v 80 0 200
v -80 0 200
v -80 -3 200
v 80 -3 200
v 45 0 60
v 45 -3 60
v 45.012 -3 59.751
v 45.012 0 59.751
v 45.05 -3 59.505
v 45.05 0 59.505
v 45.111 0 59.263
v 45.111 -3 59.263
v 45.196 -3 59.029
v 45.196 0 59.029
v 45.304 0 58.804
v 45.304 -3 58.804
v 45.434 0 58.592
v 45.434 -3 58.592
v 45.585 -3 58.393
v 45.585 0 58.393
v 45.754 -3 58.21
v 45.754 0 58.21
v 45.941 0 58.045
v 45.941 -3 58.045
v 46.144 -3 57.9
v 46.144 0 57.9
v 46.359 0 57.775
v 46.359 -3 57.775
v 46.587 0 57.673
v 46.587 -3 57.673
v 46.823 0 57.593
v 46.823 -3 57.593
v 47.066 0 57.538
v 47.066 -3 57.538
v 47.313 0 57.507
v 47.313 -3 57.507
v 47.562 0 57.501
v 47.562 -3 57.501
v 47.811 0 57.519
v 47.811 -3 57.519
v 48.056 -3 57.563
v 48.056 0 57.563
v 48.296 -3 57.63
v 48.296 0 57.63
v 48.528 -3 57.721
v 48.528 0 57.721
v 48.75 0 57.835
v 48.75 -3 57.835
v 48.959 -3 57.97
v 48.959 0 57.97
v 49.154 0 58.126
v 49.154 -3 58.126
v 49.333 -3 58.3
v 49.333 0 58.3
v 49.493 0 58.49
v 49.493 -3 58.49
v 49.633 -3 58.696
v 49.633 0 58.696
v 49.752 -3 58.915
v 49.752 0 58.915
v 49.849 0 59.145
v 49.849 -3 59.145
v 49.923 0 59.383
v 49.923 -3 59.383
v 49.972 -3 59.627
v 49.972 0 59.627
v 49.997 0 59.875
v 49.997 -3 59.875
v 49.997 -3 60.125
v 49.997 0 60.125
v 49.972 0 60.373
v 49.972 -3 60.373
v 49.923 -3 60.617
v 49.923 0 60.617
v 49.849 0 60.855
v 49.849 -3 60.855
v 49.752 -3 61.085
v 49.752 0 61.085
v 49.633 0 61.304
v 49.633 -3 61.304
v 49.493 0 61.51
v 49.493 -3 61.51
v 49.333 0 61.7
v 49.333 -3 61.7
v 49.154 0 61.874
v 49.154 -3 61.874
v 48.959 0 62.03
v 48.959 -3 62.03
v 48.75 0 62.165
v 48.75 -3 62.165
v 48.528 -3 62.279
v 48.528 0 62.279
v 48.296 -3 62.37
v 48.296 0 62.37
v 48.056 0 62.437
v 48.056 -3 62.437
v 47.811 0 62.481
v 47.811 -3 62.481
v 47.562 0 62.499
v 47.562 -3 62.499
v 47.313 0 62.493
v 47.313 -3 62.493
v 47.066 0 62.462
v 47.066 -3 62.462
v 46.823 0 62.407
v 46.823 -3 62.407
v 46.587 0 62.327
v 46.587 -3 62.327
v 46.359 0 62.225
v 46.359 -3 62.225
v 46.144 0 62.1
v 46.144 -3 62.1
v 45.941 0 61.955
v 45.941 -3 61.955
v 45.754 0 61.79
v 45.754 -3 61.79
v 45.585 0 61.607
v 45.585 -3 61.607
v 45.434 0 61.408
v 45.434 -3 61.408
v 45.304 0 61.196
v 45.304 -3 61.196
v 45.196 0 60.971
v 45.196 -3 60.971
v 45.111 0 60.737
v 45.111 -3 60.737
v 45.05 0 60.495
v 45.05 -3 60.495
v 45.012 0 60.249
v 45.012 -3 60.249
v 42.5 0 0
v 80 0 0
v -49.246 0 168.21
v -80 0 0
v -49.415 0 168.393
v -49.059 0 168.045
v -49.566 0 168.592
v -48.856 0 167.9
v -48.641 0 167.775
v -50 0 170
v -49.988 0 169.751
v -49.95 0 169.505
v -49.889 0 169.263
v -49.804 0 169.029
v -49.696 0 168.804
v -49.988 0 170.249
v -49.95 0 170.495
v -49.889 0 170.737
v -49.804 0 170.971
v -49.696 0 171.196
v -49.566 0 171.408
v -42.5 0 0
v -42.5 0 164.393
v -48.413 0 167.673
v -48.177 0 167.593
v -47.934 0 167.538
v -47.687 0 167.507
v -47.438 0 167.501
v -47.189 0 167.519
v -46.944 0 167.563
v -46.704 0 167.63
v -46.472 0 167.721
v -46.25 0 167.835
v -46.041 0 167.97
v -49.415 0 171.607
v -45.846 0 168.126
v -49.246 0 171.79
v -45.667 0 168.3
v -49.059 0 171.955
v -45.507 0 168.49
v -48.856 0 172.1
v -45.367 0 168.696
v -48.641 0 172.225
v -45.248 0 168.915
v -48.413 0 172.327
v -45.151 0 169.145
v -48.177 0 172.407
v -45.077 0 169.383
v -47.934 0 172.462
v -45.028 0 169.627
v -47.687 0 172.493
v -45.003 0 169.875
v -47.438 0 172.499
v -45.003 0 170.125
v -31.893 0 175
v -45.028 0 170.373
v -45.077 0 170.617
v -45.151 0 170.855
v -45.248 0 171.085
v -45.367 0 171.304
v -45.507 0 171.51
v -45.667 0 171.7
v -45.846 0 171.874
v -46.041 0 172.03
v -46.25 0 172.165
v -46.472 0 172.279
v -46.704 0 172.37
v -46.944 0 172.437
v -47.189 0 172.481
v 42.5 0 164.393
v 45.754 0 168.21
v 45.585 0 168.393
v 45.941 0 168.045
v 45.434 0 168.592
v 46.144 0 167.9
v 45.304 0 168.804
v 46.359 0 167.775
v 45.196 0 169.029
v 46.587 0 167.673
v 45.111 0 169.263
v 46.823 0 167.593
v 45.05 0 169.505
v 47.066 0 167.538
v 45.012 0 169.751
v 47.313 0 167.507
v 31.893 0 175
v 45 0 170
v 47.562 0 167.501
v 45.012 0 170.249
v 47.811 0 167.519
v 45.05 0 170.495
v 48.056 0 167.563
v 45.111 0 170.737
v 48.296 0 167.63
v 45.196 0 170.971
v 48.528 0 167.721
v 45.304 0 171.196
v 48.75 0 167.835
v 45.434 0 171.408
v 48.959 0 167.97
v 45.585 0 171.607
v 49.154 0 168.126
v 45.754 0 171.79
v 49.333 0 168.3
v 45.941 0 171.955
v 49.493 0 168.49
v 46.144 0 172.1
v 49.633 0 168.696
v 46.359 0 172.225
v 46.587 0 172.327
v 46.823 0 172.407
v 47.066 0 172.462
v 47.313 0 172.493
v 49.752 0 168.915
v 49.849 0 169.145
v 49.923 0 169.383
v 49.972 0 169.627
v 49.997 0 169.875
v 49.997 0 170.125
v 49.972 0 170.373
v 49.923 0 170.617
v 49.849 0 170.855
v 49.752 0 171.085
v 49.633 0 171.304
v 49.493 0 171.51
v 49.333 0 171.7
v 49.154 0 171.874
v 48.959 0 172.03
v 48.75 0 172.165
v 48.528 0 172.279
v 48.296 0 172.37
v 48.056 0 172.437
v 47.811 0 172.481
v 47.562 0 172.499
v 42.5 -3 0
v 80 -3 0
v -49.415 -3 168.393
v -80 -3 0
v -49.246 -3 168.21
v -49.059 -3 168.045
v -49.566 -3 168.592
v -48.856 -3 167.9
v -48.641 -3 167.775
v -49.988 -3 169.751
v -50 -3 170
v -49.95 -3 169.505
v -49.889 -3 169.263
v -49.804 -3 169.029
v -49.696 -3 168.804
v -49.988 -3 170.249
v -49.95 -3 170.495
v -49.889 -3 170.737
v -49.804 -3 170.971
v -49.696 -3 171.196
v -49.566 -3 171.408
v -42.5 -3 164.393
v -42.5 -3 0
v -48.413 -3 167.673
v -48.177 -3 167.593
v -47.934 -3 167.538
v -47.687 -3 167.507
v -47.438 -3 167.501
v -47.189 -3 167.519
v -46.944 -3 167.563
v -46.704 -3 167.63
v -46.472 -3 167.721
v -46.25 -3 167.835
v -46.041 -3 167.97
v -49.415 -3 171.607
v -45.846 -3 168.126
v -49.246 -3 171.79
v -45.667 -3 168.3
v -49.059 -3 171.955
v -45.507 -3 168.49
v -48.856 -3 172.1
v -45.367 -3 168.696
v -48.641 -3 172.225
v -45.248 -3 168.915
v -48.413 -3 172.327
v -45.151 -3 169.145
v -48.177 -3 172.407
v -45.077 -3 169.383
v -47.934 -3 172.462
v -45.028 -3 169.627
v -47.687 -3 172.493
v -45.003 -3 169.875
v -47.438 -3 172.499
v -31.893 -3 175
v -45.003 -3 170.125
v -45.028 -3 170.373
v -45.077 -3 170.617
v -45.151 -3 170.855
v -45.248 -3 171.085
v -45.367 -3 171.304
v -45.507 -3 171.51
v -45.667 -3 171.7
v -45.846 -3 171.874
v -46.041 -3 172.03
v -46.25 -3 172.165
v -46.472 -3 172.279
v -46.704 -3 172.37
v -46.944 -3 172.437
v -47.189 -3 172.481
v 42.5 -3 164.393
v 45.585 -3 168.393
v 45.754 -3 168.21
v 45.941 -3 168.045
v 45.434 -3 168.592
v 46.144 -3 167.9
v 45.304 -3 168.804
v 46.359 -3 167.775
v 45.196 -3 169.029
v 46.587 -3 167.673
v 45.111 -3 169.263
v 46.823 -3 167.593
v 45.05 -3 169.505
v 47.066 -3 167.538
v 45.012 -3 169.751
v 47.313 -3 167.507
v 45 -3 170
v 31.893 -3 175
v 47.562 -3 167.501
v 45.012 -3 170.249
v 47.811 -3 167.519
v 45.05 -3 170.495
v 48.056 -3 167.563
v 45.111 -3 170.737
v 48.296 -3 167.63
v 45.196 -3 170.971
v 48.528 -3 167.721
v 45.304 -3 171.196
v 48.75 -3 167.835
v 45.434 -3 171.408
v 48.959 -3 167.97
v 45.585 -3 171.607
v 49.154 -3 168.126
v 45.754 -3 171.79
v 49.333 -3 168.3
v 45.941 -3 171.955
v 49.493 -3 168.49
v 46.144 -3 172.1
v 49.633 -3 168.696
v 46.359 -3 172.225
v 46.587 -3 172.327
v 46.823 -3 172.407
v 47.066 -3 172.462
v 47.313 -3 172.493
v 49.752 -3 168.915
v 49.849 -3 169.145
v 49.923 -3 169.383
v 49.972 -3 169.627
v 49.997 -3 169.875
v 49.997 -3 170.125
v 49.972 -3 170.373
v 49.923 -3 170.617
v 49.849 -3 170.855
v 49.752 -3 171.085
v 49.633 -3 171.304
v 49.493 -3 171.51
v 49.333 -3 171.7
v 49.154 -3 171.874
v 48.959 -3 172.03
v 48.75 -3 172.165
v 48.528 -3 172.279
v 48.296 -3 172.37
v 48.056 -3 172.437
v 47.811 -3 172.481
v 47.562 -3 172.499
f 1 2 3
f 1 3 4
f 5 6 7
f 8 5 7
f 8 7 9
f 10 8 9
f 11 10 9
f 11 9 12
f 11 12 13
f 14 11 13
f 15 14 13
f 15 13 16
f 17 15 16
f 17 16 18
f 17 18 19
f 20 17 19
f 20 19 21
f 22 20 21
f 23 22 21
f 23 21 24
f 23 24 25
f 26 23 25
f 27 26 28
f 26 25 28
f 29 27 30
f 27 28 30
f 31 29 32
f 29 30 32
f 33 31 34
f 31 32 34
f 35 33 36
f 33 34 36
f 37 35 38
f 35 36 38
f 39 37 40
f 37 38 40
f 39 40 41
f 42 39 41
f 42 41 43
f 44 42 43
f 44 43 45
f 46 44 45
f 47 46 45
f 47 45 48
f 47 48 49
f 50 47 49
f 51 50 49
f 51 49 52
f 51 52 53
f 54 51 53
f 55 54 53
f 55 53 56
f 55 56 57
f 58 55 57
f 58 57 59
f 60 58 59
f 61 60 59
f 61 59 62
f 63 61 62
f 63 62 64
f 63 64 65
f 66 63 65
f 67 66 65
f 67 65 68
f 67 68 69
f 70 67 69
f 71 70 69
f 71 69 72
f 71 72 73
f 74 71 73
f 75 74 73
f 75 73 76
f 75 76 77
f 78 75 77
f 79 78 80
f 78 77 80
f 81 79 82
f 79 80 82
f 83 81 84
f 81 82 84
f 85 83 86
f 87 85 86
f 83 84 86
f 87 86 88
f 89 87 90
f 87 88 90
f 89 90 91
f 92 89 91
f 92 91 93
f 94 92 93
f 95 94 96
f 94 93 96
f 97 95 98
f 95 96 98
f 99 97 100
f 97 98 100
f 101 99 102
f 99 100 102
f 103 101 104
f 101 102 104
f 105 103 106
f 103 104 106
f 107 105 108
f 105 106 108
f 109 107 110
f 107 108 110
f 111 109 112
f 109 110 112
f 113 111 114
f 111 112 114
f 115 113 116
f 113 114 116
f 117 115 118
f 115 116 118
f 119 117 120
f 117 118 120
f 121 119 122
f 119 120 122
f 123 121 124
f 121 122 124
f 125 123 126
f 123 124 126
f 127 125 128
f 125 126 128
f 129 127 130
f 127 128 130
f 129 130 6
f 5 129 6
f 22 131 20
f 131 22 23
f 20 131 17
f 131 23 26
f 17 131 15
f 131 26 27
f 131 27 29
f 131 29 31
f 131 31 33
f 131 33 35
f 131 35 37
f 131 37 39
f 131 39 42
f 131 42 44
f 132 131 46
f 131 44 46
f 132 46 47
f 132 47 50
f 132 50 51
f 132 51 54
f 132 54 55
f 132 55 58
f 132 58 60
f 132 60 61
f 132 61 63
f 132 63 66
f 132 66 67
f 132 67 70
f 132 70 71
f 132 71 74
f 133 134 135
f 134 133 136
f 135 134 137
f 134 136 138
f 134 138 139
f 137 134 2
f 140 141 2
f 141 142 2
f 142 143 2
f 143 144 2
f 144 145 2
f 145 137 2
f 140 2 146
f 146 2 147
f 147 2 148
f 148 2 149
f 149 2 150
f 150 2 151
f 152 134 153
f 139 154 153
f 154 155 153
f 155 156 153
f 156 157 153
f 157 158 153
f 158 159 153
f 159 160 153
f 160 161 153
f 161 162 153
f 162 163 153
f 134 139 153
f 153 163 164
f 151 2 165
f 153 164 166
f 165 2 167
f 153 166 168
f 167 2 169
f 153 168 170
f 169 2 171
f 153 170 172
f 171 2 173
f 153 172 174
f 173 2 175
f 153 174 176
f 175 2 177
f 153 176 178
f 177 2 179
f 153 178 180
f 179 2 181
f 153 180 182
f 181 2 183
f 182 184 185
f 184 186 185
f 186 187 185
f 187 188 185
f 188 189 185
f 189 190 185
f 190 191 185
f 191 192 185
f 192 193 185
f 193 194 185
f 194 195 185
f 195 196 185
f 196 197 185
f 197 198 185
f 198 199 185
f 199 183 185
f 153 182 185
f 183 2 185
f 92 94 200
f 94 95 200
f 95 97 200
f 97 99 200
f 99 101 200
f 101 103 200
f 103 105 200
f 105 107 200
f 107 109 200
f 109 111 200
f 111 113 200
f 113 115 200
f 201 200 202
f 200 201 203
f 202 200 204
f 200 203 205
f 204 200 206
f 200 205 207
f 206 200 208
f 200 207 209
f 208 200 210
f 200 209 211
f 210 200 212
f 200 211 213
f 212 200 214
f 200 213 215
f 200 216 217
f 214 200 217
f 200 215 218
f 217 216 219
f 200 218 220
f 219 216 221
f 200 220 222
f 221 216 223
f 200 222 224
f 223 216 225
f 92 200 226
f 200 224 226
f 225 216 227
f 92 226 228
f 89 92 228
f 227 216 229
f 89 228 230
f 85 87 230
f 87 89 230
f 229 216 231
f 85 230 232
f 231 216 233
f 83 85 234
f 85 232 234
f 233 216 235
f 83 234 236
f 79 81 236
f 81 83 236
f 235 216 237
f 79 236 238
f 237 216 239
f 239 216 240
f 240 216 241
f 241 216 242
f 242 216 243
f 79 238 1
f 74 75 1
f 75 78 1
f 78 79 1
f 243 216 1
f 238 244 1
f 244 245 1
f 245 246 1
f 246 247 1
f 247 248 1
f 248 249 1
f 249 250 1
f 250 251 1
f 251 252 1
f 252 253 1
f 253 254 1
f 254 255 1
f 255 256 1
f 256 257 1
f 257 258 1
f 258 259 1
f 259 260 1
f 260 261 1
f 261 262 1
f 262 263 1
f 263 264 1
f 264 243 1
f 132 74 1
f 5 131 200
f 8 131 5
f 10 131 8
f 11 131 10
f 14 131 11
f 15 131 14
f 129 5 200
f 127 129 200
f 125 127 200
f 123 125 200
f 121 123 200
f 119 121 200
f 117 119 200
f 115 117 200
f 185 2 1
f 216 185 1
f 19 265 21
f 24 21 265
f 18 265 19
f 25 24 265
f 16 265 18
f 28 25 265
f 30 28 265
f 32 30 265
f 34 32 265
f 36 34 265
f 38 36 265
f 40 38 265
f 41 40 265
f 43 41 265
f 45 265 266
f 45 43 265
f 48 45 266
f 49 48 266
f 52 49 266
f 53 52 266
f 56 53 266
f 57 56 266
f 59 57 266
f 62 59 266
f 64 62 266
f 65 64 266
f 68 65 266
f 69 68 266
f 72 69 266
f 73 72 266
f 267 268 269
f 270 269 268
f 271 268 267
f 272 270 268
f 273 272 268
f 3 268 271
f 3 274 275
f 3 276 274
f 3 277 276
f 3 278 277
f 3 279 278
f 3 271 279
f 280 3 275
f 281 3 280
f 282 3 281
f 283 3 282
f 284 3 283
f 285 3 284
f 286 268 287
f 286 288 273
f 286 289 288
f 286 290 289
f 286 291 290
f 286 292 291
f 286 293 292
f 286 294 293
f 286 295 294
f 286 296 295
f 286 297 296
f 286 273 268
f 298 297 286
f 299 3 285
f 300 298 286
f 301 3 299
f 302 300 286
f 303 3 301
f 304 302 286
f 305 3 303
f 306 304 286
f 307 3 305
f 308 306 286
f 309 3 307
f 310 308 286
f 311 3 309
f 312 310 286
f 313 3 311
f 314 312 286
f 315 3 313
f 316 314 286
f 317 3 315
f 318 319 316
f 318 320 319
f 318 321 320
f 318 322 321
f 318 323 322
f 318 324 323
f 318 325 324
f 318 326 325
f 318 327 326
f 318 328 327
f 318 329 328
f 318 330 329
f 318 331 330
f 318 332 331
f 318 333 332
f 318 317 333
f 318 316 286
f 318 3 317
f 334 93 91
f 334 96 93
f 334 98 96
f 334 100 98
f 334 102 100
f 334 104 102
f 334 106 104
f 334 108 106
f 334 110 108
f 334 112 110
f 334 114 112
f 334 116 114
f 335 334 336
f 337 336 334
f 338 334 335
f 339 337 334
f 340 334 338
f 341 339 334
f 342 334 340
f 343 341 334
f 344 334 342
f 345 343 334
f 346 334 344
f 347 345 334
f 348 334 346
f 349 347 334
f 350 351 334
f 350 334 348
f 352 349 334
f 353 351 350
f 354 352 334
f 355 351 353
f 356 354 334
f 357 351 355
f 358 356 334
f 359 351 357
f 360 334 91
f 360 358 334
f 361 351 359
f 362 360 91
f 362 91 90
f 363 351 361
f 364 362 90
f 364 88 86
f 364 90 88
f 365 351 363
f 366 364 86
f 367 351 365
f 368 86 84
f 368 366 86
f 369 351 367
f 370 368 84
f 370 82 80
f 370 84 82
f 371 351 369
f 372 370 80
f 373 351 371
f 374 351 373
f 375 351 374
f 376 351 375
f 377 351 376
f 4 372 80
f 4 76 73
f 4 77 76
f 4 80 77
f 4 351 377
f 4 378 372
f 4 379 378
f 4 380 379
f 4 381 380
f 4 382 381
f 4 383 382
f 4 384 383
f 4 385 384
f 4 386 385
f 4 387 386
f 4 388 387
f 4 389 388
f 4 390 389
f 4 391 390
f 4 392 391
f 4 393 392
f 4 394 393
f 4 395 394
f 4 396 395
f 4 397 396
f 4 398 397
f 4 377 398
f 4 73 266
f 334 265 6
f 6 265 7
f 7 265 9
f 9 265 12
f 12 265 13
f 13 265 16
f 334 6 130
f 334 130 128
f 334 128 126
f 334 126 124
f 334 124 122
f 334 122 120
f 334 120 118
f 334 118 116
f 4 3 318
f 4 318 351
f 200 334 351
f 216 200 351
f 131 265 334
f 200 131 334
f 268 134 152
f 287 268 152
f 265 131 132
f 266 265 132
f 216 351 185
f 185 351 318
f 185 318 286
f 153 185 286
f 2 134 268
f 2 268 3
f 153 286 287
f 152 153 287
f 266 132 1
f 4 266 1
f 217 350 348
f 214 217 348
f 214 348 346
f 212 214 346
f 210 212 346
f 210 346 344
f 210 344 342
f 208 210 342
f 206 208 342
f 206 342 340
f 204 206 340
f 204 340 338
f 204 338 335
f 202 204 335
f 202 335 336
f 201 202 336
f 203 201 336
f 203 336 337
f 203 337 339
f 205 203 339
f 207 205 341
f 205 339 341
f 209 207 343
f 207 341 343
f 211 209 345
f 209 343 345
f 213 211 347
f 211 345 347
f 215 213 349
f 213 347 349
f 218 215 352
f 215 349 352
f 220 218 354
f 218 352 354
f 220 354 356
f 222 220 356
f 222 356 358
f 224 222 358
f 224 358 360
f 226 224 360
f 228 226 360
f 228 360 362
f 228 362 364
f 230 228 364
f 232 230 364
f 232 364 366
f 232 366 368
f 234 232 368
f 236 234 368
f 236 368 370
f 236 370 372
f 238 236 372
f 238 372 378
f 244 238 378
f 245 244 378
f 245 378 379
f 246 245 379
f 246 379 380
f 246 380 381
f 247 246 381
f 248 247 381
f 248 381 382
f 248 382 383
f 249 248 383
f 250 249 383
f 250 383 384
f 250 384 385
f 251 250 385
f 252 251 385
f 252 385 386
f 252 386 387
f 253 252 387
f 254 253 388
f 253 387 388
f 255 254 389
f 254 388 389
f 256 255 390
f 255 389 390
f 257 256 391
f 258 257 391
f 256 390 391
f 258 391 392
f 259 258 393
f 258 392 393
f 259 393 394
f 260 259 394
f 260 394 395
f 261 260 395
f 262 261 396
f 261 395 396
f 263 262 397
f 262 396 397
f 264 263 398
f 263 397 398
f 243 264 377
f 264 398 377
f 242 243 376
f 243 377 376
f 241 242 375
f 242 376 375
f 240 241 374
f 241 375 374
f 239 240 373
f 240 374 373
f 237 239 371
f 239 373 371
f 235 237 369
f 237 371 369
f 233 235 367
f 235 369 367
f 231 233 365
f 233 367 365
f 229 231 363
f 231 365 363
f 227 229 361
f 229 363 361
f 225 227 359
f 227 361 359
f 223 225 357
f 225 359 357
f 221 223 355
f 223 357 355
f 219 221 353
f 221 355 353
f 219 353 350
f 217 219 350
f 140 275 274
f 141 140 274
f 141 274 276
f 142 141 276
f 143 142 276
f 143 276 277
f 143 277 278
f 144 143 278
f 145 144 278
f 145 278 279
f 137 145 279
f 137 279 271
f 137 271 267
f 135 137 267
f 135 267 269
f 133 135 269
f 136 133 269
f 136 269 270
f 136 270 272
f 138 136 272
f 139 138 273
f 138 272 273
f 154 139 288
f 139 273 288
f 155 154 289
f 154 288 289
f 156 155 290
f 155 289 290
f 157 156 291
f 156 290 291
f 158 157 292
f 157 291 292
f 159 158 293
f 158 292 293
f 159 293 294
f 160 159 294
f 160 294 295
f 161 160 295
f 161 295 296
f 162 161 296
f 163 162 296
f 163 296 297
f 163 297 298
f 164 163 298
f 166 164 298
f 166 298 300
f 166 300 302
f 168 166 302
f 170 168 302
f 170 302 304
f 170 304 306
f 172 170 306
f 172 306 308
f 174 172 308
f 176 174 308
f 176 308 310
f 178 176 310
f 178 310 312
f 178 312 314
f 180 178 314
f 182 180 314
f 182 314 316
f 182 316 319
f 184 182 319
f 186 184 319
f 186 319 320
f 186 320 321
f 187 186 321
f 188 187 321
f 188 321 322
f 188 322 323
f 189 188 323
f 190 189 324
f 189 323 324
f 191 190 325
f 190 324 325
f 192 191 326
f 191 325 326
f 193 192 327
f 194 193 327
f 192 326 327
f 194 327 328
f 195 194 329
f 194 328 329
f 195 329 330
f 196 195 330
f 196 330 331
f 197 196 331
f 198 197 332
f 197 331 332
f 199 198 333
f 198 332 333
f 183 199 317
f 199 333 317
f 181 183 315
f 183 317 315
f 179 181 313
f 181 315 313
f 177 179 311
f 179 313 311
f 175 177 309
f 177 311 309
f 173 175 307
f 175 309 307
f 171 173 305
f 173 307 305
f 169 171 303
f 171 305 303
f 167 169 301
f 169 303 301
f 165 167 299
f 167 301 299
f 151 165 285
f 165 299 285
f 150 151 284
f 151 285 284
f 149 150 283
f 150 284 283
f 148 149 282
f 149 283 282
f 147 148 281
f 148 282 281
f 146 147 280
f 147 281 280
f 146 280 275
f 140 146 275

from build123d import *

# Parameters (mm, degrees)
F0_W     = 160
F0_H     = 200
F1_DEPTH = 3
F2_D     = 5
F4_DEPTH = 25


with BuildPart() as f1:
    # F0 (on Front) → F1 (new body)
    with BuildSketch(Plane.XZ):
        with Locations((0, 100)):
            Rectangle(F0_W, F0_H)
    extrude(amount=F1_DEPTH)

    # F2 (through all)
    with Locations(Plane(origin=(0, 0, 0), x_dir=(1, 0, 0), z_dir=(0, 1, 0))):
        with Locations((47.5, -170), (-47.5, -170), (47.5, -60)):
            Hole(F2_D / 2)

    # F3 (on face) → F4 (cut)
    with BuildSketch(Plane.XZ.offset(3)):
        Polygon((-31.8933982822, 175), (-42.5, 164.3933982822), (-42.5, 0), (42.5, 0), (42.5, 164.3933982822), (31.8933982822, 175), align=None)
    extrude(amount=-F4_DEPTH, mode=Mode.SUBTRACT)


solid = f1.part
